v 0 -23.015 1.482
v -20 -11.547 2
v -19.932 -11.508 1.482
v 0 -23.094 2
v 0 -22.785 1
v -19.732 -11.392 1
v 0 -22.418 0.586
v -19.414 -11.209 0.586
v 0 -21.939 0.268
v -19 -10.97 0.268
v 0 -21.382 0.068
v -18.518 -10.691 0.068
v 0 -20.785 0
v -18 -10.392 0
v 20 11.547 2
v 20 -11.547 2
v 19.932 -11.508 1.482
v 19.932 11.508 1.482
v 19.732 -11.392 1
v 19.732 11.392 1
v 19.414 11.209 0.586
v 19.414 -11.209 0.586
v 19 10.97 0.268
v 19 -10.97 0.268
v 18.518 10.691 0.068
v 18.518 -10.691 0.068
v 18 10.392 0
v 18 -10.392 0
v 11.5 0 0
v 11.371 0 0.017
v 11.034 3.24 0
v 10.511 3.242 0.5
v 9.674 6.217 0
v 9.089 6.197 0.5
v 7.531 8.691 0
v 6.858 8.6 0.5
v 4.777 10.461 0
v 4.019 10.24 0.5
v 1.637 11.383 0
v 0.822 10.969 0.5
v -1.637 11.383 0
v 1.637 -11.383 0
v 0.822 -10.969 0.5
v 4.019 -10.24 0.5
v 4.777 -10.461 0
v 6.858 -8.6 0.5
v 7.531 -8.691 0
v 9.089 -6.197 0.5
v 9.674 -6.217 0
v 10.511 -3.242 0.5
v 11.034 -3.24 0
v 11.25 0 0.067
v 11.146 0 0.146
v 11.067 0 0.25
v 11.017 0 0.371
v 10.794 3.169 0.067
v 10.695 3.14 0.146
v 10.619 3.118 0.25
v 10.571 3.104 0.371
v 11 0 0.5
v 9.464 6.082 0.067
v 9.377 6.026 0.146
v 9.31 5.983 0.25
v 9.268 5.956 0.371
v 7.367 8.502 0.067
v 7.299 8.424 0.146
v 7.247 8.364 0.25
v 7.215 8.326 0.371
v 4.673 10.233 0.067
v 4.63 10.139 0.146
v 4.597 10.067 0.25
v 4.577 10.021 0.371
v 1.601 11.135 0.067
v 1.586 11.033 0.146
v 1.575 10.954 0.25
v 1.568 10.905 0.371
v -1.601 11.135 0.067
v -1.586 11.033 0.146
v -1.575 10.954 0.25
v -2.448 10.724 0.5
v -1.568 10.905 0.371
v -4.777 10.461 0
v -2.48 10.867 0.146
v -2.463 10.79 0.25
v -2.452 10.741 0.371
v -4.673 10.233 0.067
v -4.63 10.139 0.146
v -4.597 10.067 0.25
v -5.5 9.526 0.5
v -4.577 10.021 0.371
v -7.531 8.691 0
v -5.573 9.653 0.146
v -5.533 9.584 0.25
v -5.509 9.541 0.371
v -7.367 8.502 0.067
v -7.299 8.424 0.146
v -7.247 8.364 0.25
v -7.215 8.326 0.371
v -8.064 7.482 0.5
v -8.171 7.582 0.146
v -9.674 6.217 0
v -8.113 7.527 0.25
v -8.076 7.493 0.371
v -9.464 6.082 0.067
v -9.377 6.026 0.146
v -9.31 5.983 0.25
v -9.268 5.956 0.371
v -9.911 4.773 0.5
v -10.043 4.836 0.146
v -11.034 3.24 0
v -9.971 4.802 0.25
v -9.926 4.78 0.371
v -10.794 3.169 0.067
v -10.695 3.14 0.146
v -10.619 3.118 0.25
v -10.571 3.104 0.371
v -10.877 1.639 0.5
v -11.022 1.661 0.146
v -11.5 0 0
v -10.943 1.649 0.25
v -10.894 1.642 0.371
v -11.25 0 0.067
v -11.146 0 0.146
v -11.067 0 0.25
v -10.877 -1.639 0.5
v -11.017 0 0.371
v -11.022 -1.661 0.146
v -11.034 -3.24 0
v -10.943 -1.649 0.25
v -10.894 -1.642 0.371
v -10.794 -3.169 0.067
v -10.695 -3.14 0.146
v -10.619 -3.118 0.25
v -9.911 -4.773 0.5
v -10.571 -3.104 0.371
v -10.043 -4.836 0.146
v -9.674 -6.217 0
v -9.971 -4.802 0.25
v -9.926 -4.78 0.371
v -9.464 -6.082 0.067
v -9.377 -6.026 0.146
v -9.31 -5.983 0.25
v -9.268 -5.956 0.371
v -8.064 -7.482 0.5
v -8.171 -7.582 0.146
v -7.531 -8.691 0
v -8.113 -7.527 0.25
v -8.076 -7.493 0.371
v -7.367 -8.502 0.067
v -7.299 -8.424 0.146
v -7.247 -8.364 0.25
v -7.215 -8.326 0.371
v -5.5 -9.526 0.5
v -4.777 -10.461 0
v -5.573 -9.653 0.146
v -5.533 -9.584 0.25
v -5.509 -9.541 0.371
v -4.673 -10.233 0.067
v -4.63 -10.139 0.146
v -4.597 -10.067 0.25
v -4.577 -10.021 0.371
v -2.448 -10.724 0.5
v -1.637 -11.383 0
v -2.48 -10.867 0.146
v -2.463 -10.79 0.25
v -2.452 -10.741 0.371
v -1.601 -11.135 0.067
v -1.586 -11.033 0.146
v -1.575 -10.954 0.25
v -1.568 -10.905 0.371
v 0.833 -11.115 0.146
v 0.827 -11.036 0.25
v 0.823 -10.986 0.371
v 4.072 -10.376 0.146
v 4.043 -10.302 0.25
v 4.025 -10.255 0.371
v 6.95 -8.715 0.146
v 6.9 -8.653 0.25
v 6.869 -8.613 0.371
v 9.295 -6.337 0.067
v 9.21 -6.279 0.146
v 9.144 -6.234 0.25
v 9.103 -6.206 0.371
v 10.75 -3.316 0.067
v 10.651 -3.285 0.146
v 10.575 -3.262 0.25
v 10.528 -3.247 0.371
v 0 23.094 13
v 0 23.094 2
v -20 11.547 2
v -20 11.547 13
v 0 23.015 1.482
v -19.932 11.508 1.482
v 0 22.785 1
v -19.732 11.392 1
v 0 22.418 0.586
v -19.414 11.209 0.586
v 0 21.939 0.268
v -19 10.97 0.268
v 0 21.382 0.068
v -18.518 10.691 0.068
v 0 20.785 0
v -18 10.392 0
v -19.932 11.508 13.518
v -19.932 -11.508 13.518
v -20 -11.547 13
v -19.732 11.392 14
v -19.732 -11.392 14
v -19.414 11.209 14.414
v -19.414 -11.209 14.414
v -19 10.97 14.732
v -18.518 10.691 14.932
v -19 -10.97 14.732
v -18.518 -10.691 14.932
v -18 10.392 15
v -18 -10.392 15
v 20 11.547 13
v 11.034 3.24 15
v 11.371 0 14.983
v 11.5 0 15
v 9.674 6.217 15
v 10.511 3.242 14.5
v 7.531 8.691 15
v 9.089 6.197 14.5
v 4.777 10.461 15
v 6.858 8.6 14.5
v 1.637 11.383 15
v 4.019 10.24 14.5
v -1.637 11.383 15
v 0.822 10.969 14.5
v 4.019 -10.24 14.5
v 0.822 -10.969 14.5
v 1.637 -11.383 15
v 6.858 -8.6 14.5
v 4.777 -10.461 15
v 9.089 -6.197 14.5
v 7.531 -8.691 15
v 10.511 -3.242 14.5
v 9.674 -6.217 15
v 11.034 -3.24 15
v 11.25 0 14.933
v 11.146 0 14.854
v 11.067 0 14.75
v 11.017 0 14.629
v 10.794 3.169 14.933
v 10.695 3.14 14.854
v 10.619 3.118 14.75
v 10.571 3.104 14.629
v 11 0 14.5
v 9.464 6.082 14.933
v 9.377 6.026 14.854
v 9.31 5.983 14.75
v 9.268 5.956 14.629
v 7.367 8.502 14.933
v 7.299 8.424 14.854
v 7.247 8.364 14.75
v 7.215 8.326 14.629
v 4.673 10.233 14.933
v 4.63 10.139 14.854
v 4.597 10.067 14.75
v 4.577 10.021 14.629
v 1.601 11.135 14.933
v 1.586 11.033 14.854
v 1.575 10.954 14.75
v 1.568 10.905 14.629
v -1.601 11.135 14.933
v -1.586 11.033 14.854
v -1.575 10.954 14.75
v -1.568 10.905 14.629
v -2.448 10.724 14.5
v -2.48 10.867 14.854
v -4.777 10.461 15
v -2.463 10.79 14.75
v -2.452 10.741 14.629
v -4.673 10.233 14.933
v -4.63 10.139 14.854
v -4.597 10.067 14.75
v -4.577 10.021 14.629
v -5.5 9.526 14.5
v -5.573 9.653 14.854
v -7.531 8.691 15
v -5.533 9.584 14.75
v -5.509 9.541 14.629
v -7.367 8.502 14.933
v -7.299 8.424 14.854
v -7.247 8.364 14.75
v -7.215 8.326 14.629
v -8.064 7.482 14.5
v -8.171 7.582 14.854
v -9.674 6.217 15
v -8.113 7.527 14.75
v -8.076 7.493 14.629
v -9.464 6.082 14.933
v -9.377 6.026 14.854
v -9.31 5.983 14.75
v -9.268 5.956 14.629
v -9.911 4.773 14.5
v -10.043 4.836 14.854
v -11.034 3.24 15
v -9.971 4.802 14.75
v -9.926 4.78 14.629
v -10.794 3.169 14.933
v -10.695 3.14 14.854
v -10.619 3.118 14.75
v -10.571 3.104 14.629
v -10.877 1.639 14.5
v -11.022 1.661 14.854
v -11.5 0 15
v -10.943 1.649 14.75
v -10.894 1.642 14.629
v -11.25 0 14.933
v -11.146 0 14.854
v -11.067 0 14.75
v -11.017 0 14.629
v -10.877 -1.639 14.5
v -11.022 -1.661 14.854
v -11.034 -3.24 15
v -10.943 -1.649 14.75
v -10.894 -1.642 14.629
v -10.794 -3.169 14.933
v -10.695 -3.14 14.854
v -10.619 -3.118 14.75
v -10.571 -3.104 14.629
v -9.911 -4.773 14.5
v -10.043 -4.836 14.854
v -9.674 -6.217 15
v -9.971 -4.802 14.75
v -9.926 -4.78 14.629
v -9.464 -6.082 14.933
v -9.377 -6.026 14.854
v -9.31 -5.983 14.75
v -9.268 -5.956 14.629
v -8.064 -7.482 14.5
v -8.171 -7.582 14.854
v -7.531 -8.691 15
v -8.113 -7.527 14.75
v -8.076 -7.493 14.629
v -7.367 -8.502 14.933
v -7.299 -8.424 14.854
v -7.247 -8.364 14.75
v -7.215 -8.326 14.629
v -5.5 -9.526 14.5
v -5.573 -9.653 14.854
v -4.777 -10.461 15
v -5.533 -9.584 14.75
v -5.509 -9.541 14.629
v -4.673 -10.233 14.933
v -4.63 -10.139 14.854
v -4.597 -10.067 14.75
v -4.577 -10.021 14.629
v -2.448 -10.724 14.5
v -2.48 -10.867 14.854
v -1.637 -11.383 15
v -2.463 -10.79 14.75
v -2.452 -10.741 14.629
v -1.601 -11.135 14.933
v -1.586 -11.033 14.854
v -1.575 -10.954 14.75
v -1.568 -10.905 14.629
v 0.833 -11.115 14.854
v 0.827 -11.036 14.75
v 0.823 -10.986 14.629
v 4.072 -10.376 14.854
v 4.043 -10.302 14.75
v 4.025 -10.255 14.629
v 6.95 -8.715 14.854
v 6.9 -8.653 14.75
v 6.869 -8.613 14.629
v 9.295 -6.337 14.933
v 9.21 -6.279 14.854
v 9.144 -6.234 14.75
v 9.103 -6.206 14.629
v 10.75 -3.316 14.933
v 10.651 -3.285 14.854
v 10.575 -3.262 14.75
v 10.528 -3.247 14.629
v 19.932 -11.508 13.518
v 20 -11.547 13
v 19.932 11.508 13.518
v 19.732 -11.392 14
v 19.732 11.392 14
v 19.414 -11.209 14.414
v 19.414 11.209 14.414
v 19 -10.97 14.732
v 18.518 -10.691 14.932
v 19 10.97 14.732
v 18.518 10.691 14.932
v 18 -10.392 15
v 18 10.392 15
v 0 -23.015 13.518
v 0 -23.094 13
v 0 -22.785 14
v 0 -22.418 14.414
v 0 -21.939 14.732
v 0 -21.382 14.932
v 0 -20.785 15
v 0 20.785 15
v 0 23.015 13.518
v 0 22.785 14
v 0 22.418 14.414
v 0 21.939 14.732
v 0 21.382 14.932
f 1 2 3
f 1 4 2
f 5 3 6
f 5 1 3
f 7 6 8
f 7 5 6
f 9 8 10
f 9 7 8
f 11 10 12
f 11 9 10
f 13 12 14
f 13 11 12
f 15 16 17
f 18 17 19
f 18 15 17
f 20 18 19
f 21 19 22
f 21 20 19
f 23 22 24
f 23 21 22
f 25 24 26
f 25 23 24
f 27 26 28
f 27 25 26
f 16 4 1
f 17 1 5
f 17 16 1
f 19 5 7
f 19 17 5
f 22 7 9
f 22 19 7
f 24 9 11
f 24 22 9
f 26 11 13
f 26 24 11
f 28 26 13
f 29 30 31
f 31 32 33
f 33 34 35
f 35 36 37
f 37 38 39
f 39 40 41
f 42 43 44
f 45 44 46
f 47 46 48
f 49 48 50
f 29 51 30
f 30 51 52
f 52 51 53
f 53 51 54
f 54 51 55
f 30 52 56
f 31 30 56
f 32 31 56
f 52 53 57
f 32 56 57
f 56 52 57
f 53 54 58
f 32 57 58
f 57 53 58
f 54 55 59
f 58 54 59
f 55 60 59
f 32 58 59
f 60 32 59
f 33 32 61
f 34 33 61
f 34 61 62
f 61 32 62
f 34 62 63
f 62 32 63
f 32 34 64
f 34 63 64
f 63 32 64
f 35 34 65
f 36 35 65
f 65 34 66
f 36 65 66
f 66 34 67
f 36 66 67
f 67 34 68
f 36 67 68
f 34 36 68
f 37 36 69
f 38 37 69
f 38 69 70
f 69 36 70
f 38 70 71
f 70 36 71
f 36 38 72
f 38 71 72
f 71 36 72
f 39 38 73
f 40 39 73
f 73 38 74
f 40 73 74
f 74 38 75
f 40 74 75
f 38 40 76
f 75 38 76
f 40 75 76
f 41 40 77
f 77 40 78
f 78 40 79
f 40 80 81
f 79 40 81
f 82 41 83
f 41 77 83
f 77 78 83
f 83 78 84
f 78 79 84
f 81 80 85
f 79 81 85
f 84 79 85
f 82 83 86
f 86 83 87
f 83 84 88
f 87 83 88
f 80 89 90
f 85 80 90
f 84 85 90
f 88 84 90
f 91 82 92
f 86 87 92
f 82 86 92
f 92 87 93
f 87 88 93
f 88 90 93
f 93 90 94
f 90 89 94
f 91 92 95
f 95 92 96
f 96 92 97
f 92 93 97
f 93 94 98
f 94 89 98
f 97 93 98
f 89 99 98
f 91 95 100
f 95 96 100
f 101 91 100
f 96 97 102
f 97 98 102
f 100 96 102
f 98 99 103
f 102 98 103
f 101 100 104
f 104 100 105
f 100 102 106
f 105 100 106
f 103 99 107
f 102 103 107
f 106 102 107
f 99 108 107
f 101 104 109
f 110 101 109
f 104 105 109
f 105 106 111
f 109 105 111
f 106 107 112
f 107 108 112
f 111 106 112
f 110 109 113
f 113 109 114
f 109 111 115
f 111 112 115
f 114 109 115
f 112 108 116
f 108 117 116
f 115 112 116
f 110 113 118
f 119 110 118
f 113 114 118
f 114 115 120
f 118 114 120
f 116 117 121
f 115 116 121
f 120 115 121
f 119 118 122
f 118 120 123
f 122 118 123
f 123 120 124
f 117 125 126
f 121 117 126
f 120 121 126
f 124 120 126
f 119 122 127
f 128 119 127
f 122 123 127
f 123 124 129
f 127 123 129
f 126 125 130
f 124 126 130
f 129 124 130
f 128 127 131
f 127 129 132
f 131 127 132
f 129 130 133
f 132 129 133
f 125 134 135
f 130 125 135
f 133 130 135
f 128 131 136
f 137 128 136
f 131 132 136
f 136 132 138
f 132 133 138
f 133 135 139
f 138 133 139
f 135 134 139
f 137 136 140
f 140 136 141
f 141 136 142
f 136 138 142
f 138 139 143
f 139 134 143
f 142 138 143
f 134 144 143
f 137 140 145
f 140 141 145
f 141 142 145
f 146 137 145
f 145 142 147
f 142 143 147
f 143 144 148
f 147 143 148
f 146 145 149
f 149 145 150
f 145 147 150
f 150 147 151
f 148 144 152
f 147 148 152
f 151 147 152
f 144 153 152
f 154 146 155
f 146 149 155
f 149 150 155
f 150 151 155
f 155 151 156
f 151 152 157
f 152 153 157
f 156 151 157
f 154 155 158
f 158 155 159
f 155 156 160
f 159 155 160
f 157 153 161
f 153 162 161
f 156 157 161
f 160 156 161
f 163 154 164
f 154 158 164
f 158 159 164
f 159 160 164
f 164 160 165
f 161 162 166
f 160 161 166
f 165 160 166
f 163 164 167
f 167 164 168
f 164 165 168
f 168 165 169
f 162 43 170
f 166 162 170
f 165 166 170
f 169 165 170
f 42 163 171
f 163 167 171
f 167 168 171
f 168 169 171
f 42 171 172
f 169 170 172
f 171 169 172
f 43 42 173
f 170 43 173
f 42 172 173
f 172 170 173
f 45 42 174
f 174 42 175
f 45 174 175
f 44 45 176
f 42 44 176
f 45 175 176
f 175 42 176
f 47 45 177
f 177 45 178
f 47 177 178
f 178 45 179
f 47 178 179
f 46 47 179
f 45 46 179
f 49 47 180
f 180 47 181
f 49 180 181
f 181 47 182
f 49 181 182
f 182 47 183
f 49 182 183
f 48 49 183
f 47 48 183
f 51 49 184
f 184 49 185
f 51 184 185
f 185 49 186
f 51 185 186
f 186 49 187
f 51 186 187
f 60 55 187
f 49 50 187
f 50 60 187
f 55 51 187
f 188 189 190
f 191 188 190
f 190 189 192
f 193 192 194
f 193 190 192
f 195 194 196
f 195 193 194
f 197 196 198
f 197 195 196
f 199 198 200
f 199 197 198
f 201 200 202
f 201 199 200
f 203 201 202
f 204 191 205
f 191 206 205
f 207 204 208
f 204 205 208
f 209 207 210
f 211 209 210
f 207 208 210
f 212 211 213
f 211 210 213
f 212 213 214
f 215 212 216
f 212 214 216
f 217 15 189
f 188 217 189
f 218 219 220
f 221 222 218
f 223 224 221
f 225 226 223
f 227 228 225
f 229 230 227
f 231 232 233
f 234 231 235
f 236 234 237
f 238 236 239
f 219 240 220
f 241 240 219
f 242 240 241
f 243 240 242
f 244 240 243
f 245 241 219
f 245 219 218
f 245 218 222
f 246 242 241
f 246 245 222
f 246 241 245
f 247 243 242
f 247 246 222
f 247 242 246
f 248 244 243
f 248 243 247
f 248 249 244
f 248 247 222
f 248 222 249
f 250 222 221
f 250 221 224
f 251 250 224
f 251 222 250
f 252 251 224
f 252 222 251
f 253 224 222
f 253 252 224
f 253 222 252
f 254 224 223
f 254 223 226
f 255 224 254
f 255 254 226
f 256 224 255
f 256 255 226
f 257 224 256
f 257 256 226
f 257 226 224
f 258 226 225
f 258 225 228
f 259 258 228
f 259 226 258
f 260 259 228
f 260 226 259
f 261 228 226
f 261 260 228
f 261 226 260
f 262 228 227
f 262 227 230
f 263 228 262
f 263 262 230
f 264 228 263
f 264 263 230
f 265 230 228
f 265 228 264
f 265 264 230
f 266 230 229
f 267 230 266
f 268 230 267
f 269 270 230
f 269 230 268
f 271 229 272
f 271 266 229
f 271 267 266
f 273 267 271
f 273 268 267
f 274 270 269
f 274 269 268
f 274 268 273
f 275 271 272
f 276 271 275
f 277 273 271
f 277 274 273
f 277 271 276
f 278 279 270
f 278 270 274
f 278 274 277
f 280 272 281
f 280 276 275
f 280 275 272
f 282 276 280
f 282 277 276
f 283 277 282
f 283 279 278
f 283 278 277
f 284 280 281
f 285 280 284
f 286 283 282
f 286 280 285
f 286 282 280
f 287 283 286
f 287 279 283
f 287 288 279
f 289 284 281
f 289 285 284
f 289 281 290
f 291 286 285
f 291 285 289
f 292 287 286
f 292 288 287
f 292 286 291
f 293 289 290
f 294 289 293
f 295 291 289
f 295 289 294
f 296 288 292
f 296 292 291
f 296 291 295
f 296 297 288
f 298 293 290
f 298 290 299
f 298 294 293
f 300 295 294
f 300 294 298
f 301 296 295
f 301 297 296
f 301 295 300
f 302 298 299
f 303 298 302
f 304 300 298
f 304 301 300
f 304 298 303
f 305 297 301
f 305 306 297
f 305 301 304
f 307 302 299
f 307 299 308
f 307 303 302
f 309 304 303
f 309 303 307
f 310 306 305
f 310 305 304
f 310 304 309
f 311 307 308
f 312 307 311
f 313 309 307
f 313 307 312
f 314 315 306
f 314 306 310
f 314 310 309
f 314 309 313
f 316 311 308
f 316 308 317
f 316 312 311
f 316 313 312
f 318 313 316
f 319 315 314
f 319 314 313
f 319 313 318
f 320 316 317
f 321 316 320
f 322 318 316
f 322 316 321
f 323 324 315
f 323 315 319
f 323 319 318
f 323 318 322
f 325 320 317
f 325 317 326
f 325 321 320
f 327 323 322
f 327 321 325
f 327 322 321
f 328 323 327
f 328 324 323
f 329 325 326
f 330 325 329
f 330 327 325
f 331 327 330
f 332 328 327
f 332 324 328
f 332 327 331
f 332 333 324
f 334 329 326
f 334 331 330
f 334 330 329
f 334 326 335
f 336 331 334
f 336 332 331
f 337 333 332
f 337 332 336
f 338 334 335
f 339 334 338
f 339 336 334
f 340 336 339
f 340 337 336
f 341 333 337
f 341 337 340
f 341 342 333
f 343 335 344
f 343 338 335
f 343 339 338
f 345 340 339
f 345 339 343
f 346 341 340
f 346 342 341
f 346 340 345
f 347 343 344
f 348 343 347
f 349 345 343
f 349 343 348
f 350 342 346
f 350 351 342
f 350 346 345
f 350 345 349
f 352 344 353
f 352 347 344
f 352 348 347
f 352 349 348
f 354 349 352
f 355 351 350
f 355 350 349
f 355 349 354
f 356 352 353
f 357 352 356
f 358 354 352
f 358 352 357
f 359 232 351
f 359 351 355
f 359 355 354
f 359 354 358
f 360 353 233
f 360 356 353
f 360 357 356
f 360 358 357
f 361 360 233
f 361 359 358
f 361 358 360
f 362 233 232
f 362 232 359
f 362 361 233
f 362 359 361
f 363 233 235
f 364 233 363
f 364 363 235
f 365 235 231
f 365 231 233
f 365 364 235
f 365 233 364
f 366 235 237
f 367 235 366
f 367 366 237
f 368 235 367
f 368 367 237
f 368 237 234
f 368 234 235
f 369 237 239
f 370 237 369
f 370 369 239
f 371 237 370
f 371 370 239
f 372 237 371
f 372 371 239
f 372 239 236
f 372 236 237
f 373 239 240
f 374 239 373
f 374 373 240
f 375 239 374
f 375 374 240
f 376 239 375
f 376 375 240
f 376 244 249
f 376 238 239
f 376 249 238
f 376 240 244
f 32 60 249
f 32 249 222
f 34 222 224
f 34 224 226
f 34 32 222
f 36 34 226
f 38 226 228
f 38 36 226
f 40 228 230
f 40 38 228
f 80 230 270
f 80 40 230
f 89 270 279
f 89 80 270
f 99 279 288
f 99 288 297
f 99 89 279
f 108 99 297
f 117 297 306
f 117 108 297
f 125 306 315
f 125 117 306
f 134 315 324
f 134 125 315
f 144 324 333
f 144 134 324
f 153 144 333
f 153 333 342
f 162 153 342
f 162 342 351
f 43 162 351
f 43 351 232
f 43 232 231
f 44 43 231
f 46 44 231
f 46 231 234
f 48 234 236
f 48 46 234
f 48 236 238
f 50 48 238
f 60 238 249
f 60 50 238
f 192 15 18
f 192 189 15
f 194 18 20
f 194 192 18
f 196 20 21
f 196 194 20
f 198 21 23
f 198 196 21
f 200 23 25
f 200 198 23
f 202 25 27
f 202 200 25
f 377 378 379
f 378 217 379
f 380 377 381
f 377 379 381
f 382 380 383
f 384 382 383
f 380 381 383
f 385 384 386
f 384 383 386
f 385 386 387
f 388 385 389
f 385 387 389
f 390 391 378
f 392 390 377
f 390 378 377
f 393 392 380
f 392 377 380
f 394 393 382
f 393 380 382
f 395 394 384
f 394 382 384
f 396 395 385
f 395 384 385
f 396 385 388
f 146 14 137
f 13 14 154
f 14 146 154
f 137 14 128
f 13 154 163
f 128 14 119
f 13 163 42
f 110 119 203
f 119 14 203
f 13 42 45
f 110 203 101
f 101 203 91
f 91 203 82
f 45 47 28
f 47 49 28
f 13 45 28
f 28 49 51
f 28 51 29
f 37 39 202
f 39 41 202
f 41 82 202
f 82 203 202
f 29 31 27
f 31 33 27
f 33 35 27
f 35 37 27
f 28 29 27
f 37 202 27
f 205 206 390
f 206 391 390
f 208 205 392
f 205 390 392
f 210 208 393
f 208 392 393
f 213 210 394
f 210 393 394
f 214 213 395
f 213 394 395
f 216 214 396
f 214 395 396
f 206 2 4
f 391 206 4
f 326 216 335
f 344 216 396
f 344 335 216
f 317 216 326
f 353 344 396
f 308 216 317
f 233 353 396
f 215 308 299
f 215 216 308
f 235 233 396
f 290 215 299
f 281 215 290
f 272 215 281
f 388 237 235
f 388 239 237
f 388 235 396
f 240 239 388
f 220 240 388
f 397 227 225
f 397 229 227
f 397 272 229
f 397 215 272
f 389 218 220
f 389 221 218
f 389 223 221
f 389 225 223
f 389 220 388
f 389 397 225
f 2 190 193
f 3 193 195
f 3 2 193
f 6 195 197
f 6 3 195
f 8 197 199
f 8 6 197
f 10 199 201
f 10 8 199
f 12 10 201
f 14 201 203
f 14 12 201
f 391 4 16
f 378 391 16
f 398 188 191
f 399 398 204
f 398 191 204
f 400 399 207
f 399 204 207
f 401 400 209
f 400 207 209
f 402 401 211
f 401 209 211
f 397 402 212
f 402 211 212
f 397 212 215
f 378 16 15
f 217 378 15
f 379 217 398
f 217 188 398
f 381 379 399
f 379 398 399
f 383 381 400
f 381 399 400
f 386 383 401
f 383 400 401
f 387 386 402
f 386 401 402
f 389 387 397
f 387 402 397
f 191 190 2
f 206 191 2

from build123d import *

# Parameters (mm, degrees)
SKETCH_1_R      = 11
EXTRUDE_1_DEPTH = 15
FILLET_1_R      = 2
FILLET_2_R      = 0.5


with BuildPart() as part:
    # 草图1 → 凸台-拉伸1 (new body)
    with BuildSketch(Plane.XY):
        Polygon((0, -23.094010768), (20, -11.547005384), (20, 11.547005384), (0, 23.094010768), (-20, 11.547005384), (-20, -11.547005384), align=None)
        Circle(SKETCH_1_R, mode=Mode.SUBTRACT)
    extrude(amount=EXTRUDE_1_DEPTH)

    # 圆角1
    fillet_1_edges = [part.edges().sort_by_distance(p)[0] for p in [
        (20, 0, 15),
        (10, 17.320508076, 15),
        (-10, 17.320508076, 15),
        (-20, 0, 15),
        (-10, -17.320508076, 15),
        (-20, 0, 0),
        (-10, 17.320508076, 0),
        (10, 17.320508076, 0),
        (10, -17.320508076, 15),
        (20, 0, 0),
        (10, -17.320508076, 0),
        (-10, -17.320508076, 0),
    ]]
    fillet(fillet_1_edges, radius=FILLET_1_R)

    # 圆角2
    fillet_2_edges = [part.edges().sort_by_distance(p)[0] for p in [
        (-11, 0, 0),
        (-11, 0, 15),
    ]]
    fillet(fillet_2_edges, radius=FILLET_2_R)


solid = part.part
